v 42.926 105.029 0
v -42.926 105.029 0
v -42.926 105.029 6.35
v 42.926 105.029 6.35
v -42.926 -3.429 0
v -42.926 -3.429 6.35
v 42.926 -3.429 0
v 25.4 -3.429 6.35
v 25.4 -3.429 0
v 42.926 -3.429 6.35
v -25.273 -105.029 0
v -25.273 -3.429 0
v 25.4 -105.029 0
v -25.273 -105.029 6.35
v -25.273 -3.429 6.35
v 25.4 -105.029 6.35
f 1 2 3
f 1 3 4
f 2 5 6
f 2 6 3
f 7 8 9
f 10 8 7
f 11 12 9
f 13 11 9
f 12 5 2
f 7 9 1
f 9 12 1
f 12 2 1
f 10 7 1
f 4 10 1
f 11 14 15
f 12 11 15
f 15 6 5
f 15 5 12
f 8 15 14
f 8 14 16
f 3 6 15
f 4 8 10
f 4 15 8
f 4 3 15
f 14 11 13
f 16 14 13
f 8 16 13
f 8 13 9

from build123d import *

# Parameters (mm, degrees)
SKETCH1_W           = 85.852
SKETCH1_H           = 210.058
BOSS_EXTRUDE1_DEPTH = 6.35
CUT_EXTRUDE1_REACH  = 115.64
SKETCH2_W           = 17.526
SKETCH2_H           = 101.6
SKETCH2_W_2         = 17.653


with BuildPart() as part:
    # Sketch1 → Boss-Extrude1 (new body)
    with BuildSketch(Plane.XY):
        Rectangle(SKETCH1_W, SKETCH1_H)
    extrude(amount=BOSS_EXTRUDE1_DEPTH)

    # Sketch2 → Cut-Extrude1 (cut, up to next)
    with BuildSketch(Plane.XY.offset(6.35), mode=Mode.PRIVATE) as cut_extrude1_sk1:
        with Locations((34.163, -54.229)):
            Rectangle(SKETCH2_W, SKETCH2_H)
    cut_extrude1_tool1 = extrude(cut_extrude1_sk1.sketch, amount=-CUT_EXTRUDE1_REACH, mode=Mode.PRIVATE) & part.part
    # Sketch2 → Cut-Extrude1 (cut, up to next)
    with BuildSketch(Plane.XY.offset(6.35), mode=Mode.PRIVATE) as cut_extrude1_sk2:
        with Locations((-34.0995, -54.229)):
            Rectangle(SKETCH2_W_2, SKETCH2_H)
    cut_extrude1_tool2 = extrude(cut_extrude1_sk2.sketch, amount=-CUT_EXTRUDE1_REACH, mode=Mode.PRIVATE) & part.part
    add(cut_extrude1_tool1.solids().sort_by_distance((34.163, -54.229, 6.35))[0], mode=Mode.SUBTRACT)
    add(cut_extrude1_tool2.solids().sort_by_distance((-34.0995, -54.229, 6.35))[0], mode=Mode.SUBTRACT)


solid = part.part
